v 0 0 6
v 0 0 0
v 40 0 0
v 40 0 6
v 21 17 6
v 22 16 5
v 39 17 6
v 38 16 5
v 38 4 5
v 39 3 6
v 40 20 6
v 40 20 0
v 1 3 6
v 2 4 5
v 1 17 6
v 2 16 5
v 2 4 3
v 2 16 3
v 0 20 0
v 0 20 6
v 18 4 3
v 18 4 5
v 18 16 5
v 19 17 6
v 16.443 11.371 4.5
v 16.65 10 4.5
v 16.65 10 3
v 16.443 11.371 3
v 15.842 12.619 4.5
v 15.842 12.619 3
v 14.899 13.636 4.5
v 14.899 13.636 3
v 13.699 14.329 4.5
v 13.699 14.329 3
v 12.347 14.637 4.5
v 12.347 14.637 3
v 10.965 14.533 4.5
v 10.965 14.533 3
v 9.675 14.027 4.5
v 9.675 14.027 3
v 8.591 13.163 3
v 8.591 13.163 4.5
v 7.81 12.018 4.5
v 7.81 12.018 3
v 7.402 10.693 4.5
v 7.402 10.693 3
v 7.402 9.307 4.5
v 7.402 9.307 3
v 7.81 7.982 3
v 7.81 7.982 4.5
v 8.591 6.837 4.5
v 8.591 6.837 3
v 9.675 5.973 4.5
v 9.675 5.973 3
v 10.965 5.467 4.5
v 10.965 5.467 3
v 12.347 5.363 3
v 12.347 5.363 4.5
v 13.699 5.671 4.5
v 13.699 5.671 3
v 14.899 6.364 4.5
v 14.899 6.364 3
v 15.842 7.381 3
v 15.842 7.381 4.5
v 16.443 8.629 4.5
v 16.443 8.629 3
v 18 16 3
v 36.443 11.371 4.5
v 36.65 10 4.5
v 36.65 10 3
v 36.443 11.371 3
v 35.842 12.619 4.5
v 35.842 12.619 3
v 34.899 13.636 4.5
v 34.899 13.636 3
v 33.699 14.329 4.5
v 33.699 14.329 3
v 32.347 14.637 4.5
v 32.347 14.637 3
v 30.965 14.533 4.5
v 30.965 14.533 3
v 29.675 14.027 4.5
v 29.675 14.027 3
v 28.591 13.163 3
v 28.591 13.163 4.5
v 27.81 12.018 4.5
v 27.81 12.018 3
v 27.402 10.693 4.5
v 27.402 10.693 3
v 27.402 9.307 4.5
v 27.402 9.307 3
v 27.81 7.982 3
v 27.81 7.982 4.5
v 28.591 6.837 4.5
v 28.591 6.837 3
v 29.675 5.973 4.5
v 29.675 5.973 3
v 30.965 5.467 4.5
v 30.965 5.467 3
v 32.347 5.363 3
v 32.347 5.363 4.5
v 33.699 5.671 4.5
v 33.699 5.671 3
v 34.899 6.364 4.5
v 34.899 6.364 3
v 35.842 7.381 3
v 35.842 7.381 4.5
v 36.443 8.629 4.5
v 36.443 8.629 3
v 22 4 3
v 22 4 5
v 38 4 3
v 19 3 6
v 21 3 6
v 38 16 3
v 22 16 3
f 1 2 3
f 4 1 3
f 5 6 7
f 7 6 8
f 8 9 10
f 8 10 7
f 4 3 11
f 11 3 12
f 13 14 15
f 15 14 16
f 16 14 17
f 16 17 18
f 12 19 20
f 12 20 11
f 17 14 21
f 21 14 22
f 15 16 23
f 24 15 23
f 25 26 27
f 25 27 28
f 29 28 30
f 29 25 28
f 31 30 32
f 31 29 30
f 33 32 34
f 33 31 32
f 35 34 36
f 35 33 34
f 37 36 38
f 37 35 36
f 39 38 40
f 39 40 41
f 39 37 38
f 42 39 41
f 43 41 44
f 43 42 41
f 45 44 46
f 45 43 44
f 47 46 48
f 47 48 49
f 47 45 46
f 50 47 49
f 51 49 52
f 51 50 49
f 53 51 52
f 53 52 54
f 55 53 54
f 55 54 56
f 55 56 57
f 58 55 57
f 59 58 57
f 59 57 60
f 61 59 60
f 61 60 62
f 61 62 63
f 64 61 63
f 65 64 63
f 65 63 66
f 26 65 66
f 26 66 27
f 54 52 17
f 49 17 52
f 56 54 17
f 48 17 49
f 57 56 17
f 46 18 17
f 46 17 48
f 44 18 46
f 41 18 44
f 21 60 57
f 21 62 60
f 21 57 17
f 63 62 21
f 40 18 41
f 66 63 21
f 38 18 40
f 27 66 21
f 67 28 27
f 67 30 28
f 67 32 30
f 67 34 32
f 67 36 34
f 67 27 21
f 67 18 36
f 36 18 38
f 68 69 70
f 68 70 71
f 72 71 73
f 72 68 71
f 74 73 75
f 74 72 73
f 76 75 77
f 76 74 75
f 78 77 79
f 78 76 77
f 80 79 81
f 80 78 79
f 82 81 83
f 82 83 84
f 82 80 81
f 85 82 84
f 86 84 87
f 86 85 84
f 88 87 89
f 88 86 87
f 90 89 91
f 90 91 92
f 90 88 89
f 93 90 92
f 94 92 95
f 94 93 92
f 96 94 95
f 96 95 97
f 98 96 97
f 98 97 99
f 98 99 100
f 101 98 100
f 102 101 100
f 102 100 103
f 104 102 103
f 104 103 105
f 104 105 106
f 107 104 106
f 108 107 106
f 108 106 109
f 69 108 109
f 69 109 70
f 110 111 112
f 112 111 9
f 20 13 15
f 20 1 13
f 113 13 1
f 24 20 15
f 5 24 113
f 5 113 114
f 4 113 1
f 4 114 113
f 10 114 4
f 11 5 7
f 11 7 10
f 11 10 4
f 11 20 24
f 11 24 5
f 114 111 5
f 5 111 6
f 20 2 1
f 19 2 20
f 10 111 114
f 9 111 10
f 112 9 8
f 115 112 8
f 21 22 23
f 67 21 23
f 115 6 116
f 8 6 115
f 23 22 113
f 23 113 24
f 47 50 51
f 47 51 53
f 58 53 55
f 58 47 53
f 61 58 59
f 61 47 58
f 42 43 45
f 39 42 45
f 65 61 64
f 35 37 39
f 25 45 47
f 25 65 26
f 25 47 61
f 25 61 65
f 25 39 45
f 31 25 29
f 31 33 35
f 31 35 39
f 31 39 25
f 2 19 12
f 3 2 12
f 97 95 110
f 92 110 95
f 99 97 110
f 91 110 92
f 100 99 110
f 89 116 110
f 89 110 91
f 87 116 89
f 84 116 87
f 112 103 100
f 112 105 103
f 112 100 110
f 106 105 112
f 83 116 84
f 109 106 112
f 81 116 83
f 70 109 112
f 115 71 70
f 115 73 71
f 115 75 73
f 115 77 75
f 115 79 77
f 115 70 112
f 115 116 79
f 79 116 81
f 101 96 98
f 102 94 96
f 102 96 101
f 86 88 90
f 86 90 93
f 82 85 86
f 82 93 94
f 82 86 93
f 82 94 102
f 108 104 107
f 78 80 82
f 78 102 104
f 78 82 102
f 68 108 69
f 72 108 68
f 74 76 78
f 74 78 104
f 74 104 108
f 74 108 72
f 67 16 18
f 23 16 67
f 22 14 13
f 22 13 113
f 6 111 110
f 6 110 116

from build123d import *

# Parameters (mm, degrees)
F0_W     = 40
F0_H     = 20
F1_DEPTH = 6
F2_W     = 16
F2_H     = 12
F2_R     = 4.65
F3_DEPTH = 3
F4_DEPTH = 1.5
F5_SIZE  = 1


with BuildPart() as f1:
    # F0 (on Top) → F1 (new body)
    with BuildSketch(Plane.XY):
        with Locations((20, 10)):
            Rectangle(F0_W, F0_H)
    extrude(amount=F1_DEPTH)

    # F2 (on face) → F3 (cut)
    with BuildSketch(Plane.XY.offset(6)):
        with Locations((10, 10)):
            Rectangle(F2_W, F2_H)
        with Locations((12, 10)):
            Circle(F2_R, mode=Mode.SUBTRACT)
        with Locations((30, 10)):
            Rectangle(F2_W, F2_H)
        with Locations((32, 10)):
            Circle(F2_R, mode=Mode.SUBTRACT)
    extrude(amount=-F3_DEPTH, mode=Mode.SUBTRACT)

    # F4 (cut): faces of the model
    f4_faces = [f1.faces().sort_by_distance(p)[0] for p in [
        (12, 10, 6),
        (32, 10, 6),
    ]]
    extrude(f4_faces, amount=-F4_DEPTH, mode=Mode.SUBTRACT)

    # F5
    f5_edges = [f1.edges().sort_by_distance(p)[0] for p in [
        (10, 16, 6),
        (18, 10, 6),
        (10, 4, 6),
        (2, 10, 6),
        (22, 10, 6),
        (30, 16, 6),
        (38, 10, 6),
        (30, 4, 6),
    ]]
    chamfer(f5_edges, length=F5_SIZE)


solid = f1.part
